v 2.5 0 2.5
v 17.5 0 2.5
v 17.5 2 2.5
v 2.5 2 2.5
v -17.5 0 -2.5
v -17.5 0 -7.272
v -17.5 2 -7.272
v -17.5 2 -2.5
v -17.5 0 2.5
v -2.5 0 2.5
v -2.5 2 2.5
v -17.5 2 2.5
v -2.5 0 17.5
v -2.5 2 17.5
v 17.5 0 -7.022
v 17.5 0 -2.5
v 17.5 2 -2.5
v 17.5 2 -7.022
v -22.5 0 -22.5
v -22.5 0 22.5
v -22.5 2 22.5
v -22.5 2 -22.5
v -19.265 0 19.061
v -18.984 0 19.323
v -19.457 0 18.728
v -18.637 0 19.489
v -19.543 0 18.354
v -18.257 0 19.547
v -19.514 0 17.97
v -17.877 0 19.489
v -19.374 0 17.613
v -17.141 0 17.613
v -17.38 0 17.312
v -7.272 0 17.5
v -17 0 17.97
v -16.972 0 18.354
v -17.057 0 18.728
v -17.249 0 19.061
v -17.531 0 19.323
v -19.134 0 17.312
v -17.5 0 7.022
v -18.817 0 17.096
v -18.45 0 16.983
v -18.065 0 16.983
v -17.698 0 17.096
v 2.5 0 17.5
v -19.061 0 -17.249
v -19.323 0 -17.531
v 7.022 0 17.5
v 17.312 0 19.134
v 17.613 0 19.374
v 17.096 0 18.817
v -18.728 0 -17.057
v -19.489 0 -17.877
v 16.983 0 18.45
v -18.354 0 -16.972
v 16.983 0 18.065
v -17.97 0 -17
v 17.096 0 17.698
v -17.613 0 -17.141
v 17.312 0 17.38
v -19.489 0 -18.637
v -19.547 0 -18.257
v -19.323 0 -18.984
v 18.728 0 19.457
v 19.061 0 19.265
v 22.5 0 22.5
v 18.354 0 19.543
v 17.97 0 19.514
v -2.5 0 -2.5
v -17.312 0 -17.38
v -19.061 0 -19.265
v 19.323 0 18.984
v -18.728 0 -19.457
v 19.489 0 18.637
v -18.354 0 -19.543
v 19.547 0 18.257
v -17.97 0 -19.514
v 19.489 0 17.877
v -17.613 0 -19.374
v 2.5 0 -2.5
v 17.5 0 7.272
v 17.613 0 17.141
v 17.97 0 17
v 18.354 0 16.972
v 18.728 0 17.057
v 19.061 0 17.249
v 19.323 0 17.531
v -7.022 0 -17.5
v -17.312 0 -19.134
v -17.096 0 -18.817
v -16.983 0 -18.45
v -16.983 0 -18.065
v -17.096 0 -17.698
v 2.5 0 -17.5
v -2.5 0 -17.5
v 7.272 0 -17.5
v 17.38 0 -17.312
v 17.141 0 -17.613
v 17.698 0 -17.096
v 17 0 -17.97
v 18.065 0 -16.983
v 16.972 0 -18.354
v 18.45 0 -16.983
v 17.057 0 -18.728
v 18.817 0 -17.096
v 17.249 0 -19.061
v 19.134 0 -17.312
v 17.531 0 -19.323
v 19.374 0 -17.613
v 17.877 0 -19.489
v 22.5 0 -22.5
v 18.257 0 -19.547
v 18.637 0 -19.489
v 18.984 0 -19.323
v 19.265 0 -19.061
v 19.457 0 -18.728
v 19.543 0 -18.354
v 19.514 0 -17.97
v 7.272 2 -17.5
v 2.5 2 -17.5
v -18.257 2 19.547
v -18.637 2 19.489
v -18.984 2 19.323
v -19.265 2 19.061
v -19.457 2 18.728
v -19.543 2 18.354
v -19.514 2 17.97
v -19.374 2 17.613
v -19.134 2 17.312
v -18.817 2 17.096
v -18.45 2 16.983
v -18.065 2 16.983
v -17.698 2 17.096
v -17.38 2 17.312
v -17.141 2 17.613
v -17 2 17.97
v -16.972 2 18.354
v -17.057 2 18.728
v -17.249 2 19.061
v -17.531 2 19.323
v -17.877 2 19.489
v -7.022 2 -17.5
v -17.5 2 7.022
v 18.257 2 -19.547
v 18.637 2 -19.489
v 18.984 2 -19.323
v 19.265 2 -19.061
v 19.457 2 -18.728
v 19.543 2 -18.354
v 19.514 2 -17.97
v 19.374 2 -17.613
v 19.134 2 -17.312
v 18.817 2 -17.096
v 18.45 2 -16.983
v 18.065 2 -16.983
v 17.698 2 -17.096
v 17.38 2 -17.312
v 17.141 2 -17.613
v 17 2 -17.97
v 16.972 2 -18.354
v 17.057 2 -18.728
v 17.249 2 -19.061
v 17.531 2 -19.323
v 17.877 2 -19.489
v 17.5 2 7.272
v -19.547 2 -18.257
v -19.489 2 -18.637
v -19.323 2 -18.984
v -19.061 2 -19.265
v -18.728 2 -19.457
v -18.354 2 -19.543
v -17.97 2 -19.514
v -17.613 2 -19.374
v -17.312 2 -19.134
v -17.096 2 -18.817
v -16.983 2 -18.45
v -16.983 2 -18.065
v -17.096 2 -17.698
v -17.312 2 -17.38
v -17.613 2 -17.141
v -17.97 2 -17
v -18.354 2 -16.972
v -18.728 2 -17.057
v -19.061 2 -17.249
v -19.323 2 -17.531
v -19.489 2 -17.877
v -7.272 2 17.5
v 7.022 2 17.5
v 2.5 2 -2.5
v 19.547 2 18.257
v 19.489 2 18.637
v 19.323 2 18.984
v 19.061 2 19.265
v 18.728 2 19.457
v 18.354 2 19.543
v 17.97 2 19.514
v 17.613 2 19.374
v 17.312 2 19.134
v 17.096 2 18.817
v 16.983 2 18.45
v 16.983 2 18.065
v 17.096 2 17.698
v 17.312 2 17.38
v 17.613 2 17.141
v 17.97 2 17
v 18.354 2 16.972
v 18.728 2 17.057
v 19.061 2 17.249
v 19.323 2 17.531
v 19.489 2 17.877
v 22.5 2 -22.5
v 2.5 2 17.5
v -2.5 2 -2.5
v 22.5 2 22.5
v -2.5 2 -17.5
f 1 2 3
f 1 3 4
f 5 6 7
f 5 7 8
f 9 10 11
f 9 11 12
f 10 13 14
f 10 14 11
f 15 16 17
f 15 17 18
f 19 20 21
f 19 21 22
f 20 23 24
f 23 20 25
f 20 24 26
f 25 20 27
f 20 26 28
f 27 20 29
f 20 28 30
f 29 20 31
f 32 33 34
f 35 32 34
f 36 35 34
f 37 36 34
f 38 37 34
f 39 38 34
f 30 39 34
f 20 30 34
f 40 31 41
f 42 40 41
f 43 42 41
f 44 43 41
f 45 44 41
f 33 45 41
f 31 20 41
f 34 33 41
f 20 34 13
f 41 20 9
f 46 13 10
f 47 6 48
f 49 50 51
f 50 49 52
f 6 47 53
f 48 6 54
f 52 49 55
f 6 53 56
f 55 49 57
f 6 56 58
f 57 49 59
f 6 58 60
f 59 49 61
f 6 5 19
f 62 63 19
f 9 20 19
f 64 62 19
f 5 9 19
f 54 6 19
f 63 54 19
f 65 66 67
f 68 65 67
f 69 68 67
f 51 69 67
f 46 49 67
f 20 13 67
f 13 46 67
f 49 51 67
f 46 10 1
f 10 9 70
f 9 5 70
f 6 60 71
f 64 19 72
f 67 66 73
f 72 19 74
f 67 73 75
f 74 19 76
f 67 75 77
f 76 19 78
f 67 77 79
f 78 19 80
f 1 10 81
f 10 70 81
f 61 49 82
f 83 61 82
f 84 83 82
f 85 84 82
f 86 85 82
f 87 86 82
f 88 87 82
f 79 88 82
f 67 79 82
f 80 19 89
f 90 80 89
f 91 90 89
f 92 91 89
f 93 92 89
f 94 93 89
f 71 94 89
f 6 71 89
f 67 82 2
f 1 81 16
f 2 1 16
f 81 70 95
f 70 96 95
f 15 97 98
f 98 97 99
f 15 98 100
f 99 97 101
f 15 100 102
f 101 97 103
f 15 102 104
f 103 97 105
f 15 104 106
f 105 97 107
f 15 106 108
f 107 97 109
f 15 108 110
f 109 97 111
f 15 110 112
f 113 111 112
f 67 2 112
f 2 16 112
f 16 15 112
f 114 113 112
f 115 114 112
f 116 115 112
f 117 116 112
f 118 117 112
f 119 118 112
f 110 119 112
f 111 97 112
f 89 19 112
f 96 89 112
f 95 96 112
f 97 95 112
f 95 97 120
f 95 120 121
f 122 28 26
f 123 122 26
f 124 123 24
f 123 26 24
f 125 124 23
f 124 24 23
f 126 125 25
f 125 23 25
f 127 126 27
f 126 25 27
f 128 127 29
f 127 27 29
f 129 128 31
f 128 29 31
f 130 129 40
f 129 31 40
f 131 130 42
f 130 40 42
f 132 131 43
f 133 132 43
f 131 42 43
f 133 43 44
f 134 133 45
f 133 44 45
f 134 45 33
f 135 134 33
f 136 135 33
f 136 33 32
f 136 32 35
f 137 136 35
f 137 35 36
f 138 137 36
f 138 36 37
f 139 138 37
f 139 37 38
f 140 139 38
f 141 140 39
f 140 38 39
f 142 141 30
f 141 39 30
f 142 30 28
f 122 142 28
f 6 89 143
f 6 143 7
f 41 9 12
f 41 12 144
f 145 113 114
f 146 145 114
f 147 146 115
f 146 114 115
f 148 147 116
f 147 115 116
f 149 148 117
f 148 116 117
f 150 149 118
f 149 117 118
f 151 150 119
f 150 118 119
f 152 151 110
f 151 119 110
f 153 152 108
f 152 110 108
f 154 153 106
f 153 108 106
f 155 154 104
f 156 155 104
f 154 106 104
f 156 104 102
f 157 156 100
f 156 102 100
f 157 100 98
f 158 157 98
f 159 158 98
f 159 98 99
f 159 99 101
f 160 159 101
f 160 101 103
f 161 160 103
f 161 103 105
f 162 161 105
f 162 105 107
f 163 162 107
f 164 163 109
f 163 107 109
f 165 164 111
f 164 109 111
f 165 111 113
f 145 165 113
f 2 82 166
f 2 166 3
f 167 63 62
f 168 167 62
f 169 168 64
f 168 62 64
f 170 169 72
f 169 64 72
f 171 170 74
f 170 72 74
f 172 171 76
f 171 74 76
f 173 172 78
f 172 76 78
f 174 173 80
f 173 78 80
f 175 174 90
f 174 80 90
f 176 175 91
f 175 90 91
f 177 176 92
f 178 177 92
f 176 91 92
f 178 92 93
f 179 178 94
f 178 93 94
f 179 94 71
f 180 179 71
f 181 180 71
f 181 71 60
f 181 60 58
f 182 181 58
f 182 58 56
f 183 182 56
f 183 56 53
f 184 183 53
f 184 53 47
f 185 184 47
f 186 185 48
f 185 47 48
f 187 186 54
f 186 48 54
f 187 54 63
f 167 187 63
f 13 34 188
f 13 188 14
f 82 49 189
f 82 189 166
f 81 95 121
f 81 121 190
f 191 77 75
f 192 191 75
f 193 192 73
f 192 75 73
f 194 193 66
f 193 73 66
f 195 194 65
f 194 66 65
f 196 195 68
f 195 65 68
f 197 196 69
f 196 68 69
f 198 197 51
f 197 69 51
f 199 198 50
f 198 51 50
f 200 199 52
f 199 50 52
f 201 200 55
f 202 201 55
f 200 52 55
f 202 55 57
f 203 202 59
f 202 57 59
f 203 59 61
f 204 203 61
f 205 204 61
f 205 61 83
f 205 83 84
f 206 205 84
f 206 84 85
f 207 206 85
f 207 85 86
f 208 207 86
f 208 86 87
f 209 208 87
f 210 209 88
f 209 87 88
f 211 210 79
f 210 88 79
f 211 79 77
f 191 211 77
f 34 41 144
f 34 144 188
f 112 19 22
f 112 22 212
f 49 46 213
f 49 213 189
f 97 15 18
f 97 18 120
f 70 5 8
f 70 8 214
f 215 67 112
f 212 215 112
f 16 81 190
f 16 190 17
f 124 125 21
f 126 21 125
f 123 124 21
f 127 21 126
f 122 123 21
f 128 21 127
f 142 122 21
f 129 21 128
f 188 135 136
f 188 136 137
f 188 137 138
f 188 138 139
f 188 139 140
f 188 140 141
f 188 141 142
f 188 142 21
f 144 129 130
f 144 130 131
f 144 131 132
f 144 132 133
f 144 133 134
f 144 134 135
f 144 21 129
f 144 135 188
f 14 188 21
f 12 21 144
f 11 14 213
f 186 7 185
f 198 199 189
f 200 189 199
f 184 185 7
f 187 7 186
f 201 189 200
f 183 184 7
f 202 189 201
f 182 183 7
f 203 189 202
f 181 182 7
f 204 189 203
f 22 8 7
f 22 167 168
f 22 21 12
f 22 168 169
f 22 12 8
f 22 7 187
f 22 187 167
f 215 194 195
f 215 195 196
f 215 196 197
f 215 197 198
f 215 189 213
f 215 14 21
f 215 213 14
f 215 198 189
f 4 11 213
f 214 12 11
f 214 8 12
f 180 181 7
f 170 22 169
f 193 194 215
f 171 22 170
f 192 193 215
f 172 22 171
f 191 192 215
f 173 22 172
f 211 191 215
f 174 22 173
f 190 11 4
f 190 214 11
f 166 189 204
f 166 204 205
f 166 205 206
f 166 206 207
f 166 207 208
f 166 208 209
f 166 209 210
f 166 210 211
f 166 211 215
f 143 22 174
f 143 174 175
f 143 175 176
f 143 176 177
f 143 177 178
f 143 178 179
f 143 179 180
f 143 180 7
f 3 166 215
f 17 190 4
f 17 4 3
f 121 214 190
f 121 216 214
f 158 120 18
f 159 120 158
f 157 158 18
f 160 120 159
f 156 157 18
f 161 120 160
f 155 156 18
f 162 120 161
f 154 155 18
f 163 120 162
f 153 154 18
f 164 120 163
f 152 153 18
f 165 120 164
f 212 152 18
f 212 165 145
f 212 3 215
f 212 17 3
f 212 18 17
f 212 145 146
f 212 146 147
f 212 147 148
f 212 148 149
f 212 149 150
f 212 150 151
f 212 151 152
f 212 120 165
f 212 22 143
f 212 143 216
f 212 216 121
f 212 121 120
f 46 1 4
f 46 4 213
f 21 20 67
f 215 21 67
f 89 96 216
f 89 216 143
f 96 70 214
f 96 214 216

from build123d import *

# Parameters (mm, degrees)
SKETCH2_W           = 45
SKETCH2_H           = 45
BOSS_EXTRUDE1_DEPTH = 2
CUT_EXTRUDE1_DEPTH  = 2
SKETCH7_R           = 1.289214756
CUT_EXTRUDE2_DEPTH  = 2
CIRPATTERN1_COUNT   = 4


with BuildPart() as part:
    # Sketch2 → Boss-Extrude1 (new body)
    with BuildSketch(Plane(origin=(0, 0, 0), x_dir=(1, 0, 0), z_dir=(0, 1, 0))):
        Rectangle(SKETCH2_W, SKETCH2_H)
    extrude(amount=BOSS_EXTRUDE1_DEPTH)

    # Sketch4 → Cut-Extrude1 (cut)
    with BuildSketch(Plane.XZ):
        Polygon((7.021849723, 17.5), (17.5, 7.271715562), (17.5, 2.5), (2.5, 2.5), (2.5, 17.5), align=None)
    cut_extrude1 = extrude(amount=-CUT_EXTRUDE1_DEPTH, mode=Mode.SUBTRACT)

    # Sketch7 → Cut-Extrude2 (cut)
    with BuildSketch(Plane.XZ):
        with Locations((18.257359313, 18.257359313)):
            Circle(SKETCH7_R)
    cut_extrude2 = extrude(amount=-CUT_EXTRUDE2_DEPTH, mode=Mode.SUBTRACT)

    # CirPattern1: Cut-Extrude1, Cut-Extrude2 ×4 about axis
    cirpattern1_axis = Axis((0, 0, 0), (0, 1, 0))
    for i in range(1, CIRPATTERN1_COUNT):
        add(cut_extrude1.rotate(cirpattern1_axis, i * 360 / CIRPATTERN1_COUNT), mode=Mode.SUBTRACT)
        add(cut_extrude2.rotate(cirpattern1_axis, i * 360 / CIRPATTERN1_COUNT), mode=Mode.SUBTRACT)


solid = part.part
